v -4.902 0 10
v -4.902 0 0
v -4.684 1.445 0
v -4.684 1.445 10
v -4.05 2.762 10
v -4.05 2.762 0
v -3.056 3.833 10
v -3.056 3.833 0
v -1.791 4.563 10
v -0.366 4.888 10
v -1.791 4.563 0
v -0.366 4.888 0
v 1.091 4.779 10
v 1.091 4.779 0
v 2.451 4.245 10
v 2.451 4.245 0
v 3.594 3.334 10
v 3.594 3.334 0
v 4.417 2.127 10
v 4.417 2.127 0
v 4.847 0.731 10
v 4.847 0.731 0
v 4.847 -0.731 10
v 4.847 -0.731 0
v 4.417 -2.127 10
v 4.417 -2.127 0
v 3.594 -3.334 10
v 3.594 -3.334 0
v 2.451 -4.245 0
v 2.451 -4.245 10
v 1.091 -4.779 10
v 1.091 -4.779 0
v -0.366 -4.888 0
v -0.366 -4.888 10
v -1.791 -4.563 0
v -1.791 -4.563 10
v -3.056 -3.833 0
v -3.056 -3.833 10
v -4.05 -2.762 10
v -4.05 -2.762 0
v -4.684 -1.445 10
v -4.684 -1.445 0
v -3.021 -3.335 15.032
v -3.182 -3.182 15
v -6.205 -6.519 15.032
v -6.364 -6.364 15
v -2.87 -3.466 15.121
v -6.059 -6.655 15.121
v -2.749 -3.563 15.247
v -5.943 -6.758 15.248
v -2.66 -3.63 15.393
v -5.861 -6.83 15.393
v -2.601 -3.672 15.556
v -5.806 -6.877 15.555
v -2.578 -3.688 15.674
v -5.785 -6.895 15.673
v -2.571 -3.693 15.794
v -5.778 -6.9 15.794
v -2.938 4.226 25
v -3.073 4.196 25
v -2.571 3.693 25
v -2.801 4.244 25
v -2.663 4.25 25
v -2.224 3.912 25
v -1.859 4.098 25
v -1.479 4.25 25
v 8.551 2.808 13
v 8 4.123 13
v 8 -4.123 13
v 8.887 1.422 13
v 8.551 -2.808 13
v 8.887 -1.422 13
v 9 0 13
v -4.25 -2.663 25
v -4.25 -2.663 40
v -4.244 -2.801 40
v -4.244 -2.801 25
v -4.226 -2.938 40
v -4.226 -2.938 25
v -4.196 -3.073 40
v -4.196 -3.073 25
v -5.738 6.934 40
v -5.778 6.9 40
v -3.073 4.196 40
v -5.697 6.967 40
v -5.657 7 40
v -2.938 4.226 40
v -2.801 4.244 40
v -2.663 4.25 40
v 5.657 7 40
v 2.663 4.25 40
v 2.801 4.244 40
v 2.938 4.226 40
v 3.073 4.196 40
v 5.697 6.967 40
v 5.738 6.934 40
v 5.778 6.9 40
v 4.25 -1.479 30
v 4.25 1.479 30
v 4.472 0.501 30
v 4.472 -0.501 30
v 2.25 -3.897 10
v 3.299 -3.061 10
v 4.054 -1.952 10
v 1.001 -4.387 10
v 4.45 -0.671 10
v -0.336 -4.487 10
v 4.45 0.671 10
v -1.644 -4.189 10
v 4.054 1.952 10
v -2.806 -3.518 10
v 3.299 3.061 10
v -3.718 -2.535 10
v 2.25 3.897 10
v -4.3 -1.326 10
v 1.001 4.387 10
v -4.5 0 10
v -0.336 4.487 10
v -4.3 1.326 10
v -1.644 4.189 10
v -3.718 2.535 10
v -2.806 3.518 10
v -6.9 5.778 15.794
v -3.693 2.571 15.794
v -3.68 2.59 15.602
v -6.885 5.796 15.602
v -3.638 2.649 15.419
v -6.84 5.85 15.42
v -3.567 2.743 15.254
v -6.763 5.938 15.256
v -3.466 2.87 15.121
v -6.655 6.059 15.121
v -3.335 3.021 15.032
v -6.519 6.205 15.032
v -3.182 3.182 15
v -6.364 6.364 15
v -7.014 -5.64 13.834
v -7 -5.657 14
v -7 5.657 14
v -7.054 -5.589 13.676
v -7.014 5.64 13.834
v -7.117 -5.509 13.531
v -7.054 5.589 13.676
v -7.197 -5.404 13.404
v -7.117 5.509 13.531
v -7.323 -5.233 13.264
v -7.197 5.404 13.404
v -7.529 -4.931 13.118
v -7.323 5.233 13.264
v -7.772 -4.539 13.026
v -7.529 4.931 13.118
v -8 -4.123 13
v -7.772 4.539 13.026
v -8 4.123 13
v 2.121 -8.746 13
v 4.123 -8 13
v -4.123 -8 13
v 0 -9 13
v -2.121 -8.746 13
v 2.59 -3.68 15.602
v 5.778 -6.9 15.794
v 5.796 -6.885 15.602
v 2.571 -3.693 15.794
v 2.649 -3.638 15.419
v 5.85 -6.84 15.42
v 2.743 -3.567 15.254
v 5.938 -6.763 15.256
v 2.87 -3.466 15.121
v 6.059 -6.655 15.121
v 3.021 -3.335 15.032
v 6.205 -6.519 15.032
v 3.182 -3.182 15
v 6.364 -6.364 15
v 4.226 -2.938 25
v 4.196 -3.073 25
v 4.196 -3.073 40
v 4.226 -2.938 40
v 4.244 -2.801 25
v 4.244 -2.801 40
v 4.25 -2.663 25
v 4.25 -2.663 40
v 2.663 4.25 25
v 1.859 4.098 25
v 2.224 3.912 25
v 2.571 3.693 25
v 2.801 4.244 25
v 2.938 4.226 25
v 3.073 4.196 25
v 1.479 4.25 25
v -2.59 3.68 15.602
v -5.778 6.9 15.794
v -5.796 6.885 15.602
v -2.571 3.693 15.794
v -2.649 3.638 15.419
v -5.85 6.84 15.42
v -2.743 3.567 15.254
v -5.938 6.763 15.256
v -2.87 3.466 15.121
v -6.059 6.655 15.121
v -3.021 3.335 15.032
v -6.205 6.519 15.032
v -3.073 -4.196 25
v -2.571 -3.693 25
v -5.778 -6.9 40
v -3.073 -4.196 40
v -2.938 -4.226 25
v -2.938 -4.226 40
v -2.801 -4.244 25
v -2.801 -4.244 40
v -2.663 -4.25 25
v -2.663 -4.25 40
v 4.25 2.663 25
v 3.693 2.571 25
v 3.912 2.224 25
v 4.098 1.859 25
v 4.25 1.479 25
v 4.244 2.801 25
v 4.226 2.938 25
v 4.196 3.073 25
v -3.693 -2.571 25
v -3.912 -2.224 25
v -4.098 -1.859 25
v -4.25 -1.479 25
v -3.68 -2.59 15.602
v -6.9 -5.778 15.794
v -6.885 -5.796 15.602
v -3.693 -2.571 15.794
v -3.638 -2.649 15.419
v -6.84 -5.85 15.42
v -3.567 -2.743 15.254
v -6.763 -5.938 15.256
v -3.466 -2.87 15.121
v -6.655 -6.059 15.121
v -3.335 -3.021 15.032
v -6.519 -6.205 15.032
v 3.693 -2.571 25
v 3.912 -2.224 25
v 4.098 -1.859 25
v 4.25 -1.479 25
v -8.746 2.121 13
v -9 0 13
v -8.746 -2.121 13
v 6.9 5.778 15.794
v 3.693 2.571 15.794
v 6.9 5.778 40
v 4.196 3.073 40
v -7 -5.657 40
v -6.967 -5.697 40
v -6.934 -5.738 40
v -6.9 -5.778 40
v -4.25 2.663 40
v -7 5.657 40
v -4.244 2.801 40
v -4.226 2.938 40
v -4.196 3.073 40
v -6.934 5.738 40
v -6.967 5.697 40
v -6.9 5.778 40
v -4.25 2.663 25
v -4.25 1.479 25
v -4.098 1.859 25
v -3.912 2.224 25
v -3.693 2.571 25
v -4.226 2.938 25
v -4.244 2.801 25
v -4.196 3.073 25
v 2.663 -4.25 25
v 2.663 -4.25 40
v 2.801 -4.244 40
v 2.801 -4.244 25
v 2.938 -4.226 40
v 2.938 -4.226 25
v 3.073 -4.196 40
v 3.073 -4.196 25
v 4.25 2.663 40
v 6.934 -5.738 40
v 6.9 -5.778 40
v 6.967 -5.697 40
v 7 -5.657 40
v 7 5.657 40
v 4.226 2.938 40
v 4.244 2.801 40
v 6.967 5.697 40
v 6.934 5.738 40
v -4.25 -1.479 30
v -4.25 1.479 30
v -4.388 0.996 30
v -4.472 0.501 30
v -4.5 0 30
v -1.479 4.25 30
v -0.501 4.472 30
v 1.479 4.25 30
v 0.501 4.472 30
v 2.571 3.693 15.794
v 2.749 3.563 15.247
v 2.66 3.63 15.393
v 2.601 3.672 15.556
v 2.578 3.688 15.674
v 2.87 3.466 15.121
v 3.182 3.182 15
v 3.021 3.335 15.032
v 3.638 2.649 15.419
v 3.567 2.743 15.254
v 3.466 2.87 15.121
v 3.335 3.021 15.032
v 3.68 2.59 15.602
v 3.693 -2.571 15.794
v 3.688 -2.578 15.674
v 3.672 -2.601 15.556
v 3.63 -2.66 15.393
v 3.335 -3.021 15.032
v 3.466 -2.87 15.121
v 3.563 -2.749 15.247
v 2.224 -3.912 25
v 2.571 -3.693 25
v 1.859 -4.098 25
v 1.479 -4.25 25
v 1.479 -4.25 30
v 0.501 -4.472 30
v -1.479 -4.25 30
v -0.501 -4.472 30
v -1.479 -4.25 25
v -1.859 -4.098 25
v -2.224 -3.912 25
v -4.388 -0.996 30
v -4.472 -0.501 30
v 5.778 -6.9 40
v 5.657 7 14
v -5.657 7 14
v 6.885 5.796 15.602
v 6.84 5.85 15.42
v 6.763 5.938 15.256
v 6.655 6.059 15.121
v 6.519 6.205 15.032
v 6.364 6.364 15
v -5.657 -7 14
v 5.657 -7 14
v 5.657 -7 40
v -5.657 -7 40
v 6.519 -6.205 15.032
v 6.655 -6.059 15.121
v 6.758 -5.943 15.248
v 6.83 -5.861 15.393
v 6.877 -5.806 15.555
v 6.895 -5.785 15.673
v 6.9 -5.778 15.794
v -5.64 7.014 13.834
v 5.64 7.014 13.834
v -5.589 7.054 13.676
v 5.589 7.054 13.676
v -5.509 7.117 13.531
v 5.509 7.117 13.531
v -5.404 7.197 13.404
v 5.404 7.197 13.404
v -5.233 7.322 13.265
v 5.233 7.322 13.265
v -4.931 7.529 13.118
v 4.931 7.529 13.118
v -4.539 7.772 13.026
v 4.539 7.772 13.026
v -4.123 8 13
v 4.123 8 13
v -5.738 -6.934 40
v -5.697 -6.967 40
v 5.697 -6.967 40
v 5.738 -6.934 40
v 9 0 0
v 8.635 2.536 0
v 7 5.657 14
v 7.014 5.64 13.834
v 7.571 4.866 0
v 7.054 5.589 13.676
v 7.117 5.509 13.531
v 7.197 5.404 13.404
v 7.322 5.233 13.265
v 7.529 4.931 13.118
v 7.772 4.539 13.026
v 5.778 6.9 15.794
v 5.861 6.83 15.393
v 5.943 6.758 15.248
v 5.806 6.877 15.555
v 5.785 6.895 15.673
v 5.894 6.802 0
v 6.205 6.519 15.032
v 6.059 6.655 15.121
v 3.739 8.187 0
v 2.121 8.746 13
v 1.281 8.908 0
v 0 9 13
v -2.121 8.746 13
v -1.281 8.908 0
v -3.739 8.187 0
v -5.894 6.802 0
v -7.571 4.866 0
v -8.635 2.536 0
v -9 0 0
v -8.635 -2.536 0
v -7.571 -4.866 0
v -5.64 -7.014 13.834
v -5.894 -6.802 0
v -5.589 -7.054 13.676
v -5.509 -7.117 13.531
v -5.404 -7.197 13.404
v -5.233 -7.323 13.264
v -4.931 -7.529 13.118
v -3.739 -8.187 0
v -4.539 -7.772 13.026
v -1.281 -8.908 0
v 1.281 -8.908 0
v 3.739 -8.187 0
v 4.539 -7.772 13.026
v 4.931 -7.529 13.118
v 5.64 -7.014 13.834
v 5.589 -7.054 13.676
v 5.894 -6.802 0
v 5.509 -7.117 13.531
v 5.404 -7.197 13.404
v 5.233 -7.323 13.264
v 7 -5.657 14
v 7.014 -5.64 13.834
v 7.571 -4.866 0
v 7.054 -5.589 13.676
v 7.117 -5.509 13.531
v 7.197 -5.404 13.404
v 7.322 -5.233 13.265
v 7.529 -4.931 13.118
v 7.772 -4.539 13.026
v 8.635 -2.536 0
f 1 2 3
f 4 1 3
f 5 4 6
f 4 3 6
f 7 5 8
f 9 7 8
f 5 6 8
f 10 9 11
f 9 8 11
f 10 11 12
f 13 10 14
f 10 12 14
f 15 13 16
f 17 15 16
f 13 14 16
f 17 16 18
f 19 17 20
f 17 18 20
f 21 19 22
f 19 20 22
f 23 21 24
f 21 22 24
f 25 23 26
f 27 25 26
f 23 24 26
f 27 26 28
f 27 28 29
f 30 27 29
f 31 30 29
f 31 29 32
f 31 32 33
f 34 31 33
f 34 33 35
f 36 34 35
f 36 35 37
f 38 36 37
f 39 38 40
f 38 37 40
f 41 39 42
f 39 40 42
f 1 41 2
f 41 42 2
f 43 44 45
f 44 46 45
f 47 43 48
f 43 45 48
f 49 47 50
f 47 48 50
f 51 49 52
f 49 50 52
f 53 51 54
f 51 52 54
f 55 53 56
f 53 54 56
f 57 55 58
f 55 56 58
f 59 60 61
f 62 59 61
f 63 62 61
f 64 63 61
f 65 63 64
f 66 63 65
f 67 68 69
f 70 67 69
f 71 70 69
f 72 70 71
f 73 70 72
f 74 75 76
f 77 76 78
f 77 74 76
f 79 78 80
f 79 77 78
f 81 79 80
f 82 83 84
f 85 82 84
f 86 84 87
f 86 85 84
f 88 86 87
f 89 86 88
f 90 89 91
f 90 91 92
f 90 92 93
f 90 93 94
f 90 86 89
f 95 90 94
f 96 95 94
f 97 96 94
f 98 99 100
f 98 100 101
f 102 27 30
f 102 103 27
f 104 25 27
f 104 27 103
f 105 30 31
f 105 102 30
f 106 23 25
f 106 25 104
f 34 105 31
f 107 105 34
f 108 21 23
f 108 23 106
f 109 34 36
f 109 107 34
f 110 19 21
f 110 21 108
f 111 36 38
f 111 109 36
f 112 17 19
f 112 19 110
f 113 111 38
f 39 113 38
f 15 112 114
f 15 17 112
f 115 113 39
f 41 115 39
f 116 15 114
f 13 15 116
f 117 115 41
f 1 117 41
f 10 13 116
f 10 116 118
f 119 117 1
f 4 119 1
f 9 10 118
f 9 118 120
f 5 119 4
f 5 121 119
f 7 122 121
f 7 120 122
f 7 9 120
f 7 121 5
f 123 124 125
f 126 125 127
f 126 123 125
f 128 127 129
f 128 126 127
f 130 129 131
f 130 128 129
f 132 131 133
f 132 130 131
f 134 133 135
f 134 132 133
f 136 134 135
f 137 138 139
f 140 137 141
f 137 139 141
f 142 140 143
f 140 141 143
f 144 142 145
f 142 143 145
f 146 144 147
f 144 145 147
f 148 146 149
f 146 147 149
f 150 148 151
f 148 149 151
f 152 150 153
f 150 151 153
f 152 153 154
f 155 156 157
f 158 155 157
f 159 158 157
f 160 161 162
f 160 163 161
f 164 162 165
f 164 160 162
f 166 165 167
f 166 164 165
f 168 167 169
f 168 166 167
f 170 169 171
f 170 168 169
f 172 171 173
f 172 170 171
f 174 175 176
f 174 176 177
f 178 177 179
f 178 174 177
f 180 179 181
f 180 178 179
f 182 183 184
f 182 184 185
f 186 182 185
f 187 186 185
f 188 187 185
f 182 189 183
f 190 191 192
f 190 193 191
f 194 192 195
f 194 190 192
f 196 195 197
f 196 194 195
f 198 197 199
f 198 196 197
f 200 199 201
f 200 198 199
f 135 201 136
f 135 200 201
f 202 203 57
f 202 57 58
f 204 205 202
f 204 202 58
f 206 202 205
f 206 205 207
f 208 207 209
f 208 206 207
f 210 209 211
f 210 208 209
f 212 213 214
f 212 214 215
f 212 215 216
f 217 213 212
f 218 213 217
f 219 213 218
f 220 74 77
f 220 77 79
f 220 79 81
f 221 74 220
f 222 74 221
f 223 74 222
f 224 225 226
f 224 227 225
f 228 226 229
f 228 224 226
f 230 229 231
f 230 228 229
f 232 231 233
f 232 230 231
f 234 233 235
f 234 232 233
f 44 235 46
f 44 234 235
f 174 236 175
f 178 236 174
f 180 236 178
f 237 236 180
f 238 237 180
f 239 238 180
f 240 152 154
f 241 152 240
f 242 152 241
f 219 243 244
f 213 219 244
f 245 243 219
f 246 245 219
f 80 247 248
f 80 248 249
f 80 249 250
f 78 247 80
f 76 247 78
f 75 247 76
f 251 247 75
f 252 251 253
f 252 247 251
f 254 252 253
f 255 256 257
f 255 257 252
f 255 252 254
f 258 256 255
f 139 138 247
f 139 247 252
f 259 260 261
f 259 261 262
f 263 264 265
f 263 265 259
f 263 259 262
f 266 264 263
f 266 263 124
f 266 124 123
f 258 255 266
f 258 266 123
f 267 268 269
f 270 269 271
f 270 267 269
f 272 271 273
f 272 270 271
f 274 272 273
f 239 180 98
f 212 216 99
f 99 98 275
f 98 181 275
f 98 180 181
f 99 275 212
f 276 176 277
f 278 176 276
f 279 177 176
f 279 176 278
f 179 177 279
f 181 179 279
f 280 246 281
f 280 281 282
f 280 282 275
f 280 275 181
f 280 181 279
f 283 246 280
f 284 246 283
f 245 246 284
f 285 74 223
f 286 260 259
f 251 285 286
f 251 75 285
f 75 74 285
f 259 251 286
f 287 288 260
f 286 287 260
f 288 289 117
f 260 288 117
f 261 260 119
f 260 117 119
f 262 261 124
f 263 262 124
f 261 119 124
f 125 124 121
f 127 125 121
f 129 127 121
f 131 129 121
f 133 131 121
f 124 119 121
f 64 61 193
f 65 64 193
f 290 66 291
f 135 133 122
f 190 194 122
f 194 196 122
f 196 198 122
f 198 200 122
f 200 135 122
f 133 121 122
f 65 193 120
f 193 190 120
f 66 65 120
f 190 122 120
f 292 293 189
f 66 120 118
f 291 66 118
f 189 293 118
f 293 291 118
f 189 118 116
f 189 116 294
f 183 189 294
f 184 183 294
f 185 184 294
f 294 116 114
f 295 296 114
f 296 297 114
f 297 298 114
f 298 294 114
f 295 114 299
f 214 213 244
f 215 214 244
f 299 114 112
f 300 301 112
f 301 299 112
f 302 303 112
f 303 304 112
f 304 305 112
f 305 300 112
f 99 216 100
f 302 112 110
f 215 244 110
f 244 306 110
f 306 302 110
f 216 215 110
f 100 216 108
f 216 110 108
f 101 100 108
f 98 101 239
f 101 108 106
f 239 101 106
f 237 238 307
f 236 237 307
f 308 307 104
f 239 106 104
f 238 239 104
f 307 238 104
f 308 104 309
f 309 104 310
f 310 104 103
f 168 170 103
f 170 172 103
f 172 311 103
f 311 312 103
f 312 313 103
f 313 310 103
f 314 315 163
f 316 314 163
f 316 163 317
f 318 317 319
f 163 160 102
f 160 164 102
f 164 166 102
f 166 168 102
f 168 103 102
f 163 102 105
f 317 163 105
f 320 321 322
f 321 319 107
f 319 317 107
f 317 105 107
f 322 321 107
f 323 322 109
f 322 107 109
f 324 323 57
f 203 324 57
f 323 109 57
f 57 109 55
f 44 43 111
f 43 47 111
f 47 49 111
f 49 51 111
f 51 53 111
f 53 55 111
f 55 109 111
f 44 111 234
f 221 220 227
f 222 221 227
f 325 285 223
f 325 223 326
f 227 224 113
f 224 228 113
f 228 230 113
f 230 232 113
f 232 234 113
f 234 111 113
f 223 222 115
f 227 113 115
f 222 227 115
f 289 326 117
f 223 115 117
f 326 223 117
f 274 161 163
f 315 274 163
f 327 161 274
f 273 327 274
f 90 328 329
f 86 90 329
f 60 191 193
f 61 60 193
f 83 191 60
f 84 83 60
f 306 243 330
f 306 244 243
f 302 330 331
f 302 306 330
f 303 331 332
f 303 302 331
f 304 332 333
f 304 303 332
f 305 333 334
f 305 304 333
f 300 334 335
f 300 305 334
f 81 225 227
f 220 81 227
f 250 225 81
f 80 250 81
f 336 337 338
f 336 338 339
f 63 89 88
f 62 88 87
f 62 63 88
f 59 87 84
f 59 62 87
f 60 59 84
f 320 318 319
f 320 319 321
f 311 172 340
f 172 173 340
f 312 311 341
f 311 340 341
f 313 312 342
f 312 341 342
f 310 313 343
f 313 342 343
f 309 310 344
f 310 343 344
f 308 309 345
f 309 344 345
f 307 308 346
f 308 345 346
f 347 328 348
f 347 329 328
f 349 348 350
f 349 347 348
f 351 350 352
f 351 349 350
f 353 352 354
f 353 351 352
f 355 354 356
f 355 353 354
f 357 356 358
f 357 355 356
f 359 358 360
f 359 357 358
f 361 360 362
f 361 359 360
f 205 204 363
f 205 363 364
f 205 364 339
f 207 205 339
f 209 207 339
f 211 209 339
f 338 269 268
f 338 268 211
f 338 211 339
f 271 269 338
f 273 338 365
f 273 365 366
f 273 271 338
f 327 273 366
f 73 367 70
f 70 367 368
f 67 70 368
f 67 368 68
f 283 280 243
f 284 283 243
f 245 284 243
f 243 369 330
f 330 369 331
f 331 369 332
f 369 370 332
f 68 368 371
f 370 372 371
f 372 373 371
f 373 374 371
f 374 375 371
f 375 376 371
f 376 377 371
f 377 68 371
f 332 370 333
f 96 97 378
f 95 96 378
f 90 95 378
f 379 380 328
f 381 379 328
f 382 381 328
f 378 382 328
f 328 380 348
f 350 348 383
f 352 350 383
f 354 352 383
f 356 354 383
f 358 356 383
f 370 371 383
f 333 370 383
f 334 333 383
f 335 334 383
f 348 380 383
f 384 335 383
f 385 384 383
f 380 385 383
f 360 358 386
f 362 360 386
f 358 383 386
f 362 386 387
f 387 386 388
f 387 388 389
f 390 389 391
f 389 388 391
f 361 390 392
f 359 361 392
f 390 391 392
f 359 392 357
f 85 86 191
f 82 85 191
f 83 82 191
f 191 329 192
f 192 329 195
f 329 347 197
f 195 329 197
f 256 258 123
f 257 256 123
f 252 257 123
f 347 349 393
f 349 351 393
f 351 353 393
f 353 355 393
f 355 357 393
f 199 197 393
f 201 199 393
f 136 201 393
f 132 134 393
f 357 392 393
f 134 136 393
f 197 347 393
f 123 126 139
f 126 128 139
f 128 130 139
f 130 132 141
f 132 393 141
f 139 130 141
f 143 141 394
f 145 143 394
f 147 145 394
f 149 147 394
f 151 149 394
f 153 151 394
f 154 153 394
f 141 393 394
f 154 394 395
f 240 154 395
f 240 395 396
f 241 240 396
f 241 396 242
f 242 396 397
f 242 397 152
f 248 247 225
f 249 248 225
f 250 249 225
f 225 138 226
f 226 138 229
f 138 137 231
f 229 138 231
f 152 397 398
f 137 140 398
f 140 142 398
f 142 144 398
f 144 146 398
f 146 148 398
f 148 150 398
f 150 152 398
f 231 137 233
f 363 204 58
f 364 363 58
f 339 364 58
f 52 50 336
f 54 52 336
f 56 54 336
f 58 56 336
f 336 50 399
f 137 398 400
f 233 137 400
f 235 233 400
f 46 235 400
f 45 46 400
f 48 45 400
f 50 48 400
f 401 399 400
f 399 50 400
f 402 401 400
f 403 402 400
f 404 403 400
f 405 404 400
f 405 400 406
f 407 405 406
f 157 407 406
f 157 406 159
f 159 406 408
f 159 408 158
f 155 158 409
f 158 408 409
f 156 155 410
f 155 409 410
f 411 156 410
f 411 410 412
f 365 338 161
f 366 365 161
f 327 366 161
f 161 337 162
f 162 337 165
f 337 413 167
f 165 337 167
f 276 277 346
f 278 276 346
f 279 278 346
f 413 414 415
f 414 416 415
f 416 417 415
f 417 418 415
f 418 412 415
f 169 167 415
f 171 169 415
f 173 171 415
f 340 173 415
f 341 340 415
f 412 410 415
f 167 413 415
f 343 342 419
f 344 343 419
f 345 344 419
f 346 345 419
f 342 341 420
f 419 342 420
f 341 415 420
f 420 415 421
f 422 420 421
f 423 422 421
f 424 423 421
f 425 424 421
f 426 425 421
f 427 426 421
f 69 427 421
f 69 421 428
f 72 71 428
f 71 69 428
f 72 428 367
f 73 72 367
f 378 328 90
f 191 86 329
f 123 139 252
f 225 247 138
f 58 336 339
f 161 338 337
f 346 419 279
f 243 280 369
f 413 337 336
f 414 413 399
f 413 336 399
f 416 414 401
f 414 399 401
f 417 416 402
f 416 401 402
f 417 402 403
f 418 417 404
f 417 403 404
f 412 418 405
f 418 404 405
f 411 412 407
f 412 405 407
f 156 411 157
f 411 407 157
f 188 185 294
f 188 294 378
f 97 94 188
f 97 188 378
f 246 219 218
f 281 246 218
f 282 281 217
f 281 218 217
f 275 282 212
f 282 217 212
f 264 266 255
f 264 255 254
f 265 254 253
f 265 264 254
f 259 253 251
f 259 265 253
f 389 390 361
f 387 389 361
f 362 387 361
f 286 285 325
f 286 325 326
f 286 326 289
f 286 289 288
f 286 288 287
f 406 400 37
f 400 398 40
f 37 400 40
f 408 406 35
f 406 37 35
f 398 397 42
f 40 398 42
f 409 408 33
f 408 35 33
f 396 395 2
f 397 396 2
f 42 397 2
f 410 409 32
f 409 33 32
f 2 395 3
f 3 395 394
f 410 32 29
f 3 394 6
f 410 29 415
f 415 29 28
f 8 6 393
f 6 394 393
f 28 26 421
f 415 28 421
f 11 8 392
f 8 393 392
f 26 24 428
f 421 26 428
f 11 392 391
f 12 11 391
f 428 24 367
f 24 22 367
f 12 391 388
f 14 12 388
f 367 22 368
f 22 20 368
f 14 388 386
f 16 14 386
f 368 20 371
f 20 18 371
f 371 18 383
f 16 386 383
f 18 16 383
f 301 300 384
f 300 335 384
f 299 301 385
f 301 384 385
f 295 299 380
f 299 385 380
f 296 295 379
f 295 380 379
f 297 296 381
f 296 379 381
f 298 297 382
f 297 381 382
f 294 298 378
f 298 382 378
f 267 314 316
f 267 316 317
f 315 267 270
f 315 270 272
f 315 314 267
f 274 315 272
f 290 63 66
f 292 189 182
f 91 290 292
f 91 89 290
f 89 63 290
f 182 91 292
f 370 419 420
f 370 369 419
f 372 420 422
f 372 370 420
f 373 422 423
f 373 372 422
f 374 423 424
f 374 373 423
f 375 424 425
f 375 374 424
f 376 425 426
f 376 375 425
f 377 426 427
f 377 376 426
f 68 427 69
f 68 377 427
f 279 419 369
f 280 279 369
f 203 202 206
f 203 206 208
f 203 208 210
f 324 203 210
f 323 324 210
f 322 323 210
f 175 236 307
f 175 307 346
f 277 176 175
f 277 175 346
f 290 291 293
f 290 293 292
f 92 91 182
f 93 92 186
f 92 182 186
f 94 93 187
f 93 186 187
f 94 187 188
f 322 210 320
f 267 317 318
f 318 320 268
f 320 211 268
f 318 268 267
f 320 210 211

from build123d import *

# Parameters (mm, degrees)
SKETCH1_R                = 9
SKETCH1_R_2              = 4.25
BOSS_EXTRUDE1_DEPTH      = 40
SKETCH2_R                = 4.9022
CUT_EXTRUDE1_DEPTH       = 10
SKETCH3_R                = 14.693864286
SKETCH3_W                = 14
SKETCH3_H                = 14
CUT_EXTRUDE2_DEPTH       = 40
SKETCH5_R                = 4.5
CUT_EXTRUDE4_DEPTH       = 30
SKETCH14_W               = 8.5
SKETCH14_H               = 8.5
CUT_EXTRUDE10_DEPTH      = 15
FILLET5_R                = 1.5875
CUT_EXTRUDE8_DEPTH       = 25
FILLET6_R                = 0.79375
CIRPATTERN2_COUNT        = 4
FILLET6_OF_CIRPATTERN2_R = 0.79375
FILLET4_R                = 1


with BuildPart() as part:
    # Sketch1 → Boss-Extrude1 (new body)
    with BuildSketch(Plane.XY):
        Circle(SKETCH1_R)
        Circle(SKETCH1_R_2, mode=Mode.SUBTRACT)
    extrude(amount=BOSS_EXTRUDE1_DEPTH)

    # Sketch2 → Cut-Extrude1 (cut)
    with BuildSketch(Plane(origin=(0, 0, 0), x_dir=(-1, 0, 0), z_dir=(0, 0, -1))):
        Circle(SKETCH2_R)
    extrude(amount=-CUT_EXTRUDE1_DEPTH, mode=Mode.SUBTRACT)

    # Sketch3 → Cut-Extrude2 (cut)
    with BuildSketch(Plane(origin=(0, 0, 13), x_dir=(-1, 0, 0), z_dir=(0, 0, -1))):
        Circle(SKETCH3_R)
        Rectangle(SKETCH3_W, SKETCH3_H, mode=Mode.SUBTRACT)
    extrude(amount=-CUT_EXTRUDE2_DEPTH, mode=Mode.SUBTRACT)

    # Sketch5 → Cut-Extrude4 (cut)
    with BuildSketch(Plane(origin=(0, 0, 0), x_dir=(-1, 0, 0), z_dir=(0, 0, -1))):
        Circle(SKETCH5_R)
    extrude(amount=-CUT_EXTRUDE4_DEPTH, mode=Mode.SUBTRACT)

    # Sketch14 → Cut-Extrude10 (cut)
    with BuildSketch(Plane.XY.offset(40)):
        Rectangle(SKETCH14_W, SKETCH14_H)
    extrude(amount=-CUT_EXTRUDE10_DEPTH, mode=Mode.SUBTRACT)

    # Fillet5
    fillet5_edges = [part.edges().sort_by_distance(p)[0] for p in [
        (-4.25, -4.25, 32.5),
        (-4.25, 4.25, 32.5),
        (4.25, 4.25, 32.5),
        (4.25, -4.25, 32.5),
    ]]
    fillet(fillet5_edges, radius=FILLET5_R)

    # Sketch11 → Cut-Extrude8 (cut)
    with BuildSketch(Plane.XY.offset(40)):
        with BuildLine():
            Line((-0.561266008, -0.561266008), (-7.411347572, 6.288815557))
            ThreePointArc((-7.411347572, 6.288815557), (-7.411347572, 7.411347572), (-6.288815557, 7.411347572))
            Line((-6.288815557, 7.411347572), (0.561266008, 0.561266008))
            ThreePointArc((0.561266008, 0.561266008), (0.561266008, -0.561266008), (-0.561266008, -0.561266008))
        make_face()
    cut_extrude8 = extrude(amount=-CUT_EXTRUDE8_DEPTH, mode=Mode.SUBTRACT)

    # Fillet6
    fillet6_edges = [part.edges().sort_by_distance(p)[0] for p in [
        (-4.174359631, 5.296891646, 15),
        (-5.296891646, 4.174359631, 15),
    ]]
    fillet(fillet6_edges, radius=FILLET6_R - 0.0001)  # a hair under: the kernel refuses the full size

    # CirPattern2: Cut-Extrude8 ×4 about axis
    cirpattern2_axis = Axis((0, 0, 0), (0, 0, 1))
    for i in range(1, CIRPATTERN2_COUNT):
        add(cut_extrude8.rotate(cirpattern2_axis, i * 360 / CIRPATTERN2_COUNT), mode=Mode.SUBTRACT)

    # Fillet6 of CirPattern2
    fillet6_of_cirpattern2_edges = [part.edges().sort_by_distance(p)[0] for p in [
        (-5.296891646, -4.174359631, 15),
        (-4.174359631, -5.296891646, 15),
        (4.174359631, -5.296891646, 15),
        (5.296891646, -4.174359631, 15),
        (5.296891646, 4.174359631, 15),
        (4.174359631, 5.296891646, 15),
    ]]
    fillet(fillet6_of_cirpattern2_edges, radius=FILLET6_OF_CIRPATTERN2_R - 0.0001)  # a hair under: the kernel refuses the full size

    # Fillet4
    fillet4_edges = [part.edges().sort_by_distance(p)[0] for p in [
        (-7, 0, 13),
        (0, -7, 13),
        (7, 0, 13),
        (0, 7, 13),
    ]]
    fillet(fillet4_edges, radius=FILLET4_R)


solid = part.part
